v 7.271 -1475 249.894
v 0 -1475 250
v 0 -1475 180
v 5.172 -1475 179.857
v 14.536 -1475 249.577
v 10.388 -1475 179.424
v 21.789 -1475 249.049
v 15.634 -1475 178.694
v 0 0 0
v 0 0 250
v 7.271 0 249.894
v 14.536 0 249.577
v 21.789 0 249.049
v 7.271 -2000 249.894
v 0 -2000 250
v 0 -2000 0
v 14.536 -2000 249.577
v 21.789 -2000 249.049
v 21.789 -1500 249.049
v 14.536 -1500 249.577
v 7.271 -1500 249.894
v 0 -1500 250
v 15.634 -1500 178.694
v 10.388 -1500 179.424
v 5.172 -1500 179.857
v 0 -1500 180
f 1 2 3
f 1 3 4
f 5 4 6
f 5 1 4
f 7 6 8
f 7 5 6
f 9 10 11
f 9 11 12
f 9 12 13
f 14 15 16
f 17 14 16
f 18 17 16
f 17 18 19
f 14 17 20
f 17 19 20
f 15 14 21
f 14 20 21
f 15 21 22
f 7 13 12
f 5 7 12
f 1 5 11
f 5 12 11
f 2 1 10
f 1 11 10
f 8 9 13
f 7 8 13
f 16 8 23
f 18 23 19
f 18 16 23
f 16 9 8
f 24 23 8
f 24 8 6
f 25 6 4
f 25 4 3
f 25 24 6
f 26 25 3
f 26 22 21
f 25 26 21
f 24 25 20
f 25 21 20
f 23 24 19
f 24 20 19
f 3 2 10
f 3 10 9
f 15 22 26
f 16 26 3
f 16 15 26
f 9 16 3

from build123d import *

# Parameters (mm, degrees)
F0_R     = 250
F1_DEPTH = 2000
F3_W     = 886.840463
F3_H     = 523.860752
F4_DEPTH = 25
F6_DEPTH = 2000


with BuildPart() as f1:
    # F0 (on Front) → F1 (new body)
    with BuildSketch(Plane.XZ):
        Circle(F0_R)
    extrude(amount=F1_DEPTH)

    # F3 (on offset) → F4 (cut)
    with BuildSketch(Plane.XZ.offset(1500)):
        with Locations((77.082694, -5.228102)):
            Rectangle(F3_W, F3_H)
        with BuildLine():
            add(Edge.make_bspline(
                [(130, 0), (130, 311.769145), (-65, 155.884573), (-260, 0), (-65, -155.884573), (130, -311.769145), (130, 0)],
                knots=[4.712389, 4.712389, 4.712389, 6.806784, 6.806784, 8.901179, 8.901179, 10.995574, 10.995574, 10.995574], degree=2, weights=[1, 0.5, 1, 0.5, 1, 0.5, 1]))
        make_face(mode=Mode.SUBTRACT)
    extrude(amount=-F4_DEPTH, mode=Mode.SUBTRACT)

    # F5 (on face) → F6 (intersect)
    with BuildSketch(Plane.XZ.offset(2000)):
        with BuildLine():
            Line((0, 250), (0, 0))
            Line((0, 0), (21.788936, 249.048675))
            ThreePointArc((21.788936, 249.048675), (10.904847, 249.762055), (0, 250))
        make_face()
    extrude(amount=-F6_DEPTH, mode=Mode.INTERSECT)


solid = f1.part
